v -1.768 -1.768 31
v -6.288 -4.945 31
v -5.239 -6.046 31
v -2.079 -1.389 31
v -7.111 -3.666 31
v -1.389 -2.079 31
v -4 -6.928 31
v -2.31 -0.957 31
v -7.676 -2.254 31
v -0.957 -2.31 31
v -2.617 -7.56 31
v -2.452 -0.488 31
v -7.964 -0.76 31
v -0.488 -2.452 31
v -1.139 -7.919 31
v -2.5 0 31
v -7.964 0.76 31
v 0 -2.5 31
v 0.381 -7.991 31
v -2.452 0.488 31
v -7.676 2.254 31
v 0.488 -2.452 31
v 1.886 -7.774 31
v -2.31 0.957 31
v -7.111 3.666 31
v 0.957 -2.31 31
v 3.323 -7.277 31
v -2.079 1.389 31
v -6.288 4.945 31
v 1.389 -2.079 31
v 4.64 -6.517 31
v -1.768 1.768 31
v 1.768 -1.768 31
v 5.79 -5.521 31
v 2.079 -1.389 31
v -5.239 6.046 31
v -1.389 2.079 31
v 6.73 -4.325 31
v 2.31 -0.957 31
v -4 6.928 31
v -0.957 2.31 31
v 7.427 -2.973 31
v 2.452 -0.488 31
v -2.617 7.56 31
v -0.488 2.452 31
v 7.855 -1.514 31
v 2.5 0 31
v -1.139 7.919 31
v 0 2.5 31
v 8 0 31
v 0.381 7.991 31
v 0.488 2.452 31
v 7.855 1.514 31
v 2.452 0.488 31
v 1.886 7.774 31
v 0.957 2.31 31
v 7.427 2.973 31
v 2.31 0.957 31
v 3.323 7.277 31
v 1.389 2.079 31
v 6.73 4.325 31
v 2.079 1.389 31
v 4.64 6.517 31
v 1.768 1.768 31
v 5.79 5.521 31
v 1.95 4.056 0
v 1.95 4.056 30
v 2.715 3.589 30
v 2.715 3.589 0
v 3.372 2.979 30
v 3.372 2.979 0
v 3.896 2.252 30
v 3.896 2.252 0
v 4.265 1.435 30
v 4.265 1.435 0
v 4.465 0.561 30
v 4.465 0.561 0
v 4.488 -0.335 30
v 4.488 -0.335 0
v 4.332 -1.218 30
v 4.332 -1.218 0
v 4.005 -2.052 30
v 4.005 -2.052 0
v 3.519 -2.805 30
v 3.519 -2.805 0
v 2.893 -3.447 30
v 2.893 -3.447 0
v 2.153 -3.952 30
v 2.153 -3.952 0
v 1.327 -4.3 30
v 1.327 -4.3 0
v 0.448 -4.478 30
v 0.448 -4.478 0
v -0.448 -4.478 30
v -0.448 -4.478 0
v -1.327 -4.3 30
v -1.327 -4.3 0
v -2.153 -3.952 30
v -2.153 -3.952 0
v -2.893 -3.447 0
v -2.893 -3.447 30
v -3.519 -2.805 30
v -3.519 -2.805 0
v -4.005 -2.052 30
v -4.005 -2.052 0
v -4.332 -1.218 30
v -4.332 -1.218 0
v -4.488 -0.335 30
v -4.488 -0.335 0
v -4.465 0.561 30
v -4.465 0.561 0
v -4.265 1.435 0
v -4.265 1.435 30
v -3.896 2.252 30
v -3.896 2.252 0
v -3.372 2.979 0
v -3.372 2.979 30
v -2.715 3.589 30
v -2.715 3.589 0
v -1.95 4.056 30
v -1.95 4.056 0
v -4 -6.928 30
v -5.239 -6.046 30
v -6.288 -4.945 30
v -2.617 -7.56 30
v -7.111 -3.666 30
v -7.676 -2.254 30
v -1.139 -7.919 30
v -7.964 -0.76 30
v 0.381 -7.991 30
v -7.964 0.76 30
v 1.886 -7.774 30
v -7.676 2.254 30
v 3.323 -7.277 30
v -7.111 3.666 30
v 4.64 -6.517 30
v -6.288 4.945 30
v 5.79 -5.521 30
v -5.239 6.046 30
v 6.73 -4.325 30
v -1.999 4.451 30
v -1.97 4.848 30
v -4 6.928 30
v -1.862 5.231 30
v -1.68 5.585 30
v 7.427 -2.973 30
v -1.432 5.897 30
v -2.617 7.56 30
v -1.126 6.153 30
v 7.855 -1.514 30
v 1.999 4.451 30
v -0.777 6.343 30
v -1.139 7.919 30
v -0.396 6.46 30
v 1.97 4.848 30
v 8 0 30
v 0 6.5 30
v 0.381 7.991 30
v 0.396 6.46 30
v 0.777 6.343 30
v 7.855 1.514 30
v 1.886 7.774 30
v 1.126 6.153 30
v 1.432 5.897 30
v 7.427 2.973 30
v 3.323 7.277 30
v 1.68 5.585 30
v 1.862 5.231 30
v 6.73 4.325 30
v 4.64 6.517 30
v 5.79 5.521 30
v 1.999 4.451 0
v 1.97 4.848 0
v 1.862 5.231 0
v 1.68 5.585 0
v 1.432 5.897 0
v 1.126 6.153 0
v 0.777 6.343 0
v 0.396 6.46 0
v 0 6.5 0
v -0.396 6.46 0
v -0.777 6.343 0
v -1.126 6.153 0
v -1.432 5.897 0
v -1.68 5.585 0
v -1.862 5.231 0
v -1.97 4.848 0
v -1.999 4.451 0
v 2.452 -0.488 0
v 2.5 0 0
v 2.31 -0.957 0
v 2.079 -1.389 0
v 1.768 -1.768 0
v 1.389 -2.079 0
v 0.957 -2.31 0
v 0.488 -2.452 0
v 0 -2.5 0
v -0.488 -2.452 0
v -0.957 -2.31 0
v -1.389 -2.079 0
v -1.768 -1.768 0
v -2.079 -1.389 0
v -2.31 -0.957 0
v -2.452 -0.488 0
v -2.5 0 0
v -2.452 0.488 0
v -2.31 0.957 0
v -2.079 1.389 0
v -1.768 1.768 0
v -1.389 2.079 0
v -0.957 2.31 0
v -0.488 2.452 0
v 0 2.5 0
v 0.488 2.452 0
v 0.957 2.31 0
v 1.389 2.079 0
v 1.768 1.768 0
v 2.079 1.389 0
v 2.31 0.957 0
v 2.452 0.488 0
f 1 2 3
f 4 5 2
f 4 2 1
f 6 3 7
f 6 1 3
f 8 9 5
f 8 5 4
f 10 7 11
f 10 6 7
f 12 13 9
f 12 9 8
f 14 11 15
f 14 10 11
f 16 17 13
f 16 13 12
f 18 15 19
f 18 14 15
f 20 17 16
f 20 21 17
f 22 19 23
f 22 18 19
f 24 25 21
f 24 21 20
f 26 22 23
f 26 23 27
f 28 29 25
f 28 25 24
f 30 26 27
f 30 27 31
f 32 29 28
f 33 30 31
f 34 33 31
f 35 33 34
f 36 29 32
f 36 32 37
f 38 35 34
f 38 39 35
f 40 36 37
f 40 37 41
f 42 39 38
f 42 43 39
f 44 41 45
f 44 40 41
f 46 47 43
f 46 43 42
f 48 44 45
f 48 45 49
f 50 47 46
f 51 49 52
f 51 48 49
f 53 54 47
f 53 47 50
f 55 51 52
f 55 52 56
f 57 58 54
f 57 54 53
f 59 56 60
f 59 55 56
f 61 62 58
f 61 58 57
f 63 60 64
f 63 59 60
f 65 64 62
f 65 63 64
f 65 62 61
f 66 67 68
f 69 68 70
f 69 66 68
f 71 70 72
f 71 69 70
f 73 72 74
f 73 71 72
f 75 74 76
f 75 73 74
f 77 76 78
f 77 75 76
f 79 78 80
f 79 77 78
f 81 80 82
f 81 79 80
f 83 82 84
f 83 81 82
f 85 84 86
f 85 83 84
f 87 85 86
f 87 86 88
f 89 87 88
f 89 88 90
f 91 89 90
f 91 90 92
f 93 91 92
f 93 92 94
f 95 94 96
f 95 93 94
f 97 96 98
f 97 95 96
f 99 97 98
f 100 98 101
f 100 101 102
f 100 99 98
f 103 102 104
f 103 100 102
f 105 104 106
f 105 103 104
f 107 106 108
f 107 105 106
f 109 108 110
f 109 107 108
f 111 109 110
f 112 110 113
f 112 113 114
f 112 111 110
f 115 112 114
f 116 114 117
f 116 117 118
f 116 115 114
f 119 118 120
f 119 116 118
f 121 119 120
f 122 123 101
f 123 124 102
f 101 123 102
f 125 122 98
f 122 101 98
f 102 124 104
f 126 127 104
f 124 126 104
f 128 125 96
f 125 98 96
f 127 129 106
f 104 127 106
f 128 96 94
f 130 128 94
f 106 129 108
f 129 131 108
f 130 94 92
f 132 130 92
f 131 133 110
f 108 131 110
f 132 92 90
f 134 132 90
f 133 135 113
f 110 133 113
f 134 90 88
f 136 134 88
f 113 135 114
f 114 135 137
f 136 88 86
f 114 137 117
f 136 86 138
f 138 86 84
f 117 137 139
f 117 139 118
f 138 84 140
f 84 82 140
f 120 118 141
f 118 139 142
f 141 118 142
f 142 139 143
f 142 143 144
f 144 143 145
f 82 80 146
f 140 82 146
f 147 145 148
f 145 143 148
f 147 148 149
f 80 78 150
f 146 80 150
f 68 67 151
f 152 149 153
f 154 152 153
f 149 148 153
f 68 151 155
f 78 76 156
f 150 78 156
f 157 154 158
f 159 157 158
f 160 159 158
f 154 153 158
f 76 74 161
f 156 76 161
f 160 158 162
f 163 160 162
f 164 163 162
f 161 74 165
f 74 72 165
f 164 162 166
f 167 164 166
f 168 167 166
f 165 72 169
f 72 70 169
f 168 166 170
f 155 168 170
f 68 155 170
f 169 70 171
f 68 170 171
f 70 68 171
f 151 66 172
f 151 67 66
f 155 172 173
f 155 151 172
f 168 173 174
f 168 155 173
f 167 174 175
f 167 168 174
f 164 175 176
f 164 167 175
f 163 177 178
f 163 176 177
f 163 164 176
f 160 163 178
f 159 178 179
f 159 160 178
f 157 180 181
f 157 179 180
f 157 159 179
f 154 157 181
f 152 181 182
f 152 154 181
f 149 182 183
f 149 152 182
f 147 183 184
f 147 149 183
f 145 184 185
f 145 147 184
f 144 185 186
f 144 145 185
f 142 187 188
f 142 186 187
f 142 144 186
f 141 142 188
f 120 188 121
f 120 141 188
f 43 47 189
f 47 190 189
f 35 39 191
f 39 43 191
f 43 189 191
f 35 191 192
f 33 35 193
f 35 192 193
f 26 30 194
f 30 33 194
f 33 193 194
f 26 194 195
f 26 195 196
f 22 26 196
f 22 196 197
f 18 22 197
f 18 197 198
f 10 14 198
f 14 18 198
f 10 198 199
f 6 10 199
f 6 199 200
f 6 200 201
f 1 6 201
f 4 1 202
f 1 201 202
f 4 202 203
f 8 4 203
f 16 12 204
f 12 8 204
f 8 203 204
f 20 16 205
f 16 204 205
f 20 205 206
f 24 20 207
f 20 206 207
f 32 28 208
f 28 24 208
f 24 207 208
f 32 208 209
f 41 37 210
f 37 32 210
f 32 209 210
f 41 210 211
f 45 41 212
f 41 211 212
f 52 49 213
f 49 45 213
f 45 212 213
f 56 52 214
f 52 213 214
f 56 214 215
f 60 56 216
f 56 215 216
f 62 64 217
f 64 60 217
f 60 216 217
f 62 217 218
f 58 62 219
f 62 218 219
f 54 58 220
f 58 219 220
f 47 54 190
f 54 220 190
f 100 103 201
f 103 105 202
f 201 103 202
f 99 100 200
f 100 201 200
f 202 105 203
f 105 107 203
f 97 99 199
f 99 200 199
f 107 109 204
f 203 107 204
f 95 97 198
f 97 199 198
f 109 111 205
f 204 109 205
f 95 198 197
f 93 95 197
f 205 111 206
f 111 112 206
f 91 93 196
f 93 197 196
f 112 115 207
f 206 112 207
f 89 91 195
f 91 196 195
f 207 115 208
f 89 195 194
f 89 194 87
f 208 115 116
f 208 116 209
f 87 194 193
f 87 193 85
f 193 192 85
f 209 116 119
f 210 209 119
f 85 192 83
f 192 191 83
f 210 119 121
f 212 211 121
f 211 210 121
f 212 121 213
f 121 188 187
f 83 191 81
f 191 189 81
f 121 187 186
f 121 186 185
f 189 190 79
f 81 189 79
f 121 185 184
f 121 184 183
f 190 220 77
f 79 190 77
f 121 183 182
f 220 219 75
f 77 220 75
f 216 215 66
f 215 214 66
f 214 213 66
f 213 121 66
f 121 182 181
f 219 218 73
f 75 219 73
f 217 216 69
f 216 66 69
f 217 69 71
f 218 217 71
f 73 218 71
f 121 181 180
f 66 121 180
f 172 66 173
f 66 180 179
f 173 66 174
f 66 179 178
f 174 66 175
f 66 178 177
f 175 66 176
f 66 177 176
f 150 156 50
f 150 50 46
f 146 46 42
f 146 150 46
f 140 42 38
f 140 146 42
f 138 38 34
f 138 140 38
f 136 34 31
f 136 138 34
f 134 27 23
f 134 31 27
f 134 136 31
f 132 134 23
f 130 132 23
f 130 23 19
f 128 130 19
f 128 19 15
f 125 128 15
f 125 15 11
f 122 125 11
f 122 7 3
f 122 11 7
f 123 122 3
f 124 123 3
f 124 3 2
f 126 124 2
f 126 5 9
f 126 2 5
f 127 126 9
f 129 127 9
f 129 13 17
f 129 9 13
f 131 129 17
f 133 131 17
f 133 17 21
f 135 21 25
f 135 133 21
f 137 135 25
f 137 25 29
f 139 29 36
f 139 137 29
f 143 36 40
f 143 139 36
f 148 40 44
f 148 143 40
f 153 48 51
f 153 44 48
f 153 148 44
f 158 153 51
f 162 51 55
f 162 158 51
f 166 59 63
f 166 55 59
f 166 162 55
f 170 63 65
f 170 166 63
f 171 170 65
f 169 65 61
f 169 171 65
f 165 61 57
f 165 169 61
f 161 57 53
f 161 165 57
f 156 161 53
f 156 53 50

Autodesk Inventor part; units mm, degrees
ref_plane "YZ Plane" through (0, 0, 0) normal (1, 0, 0) x (0, 1, 0)
ref_plane "XZ Plane" through (0, 0, 0) normal (0, 1, 0) x (-1, 0, 0)
ref_plane "XY Plane" through (0, 0, 0) normal (0, 0, 1) x (1, 0, 0)
sketch "Skizze1" plane through (0, 0, 0) normal (0, 0, 1) x (1, 0, 0)
  circle A0 centre (0, 0) radius 2.5
  circle A1 centre (0, 0) radius 4.5
  dimension "d0" = 5
  dimension "d1" = 9
extrude "Extrusion1" add sketch "Skizze1" along normal blind 30
sketch "Skizze2" plane through (0, 0, 30) normal (0, 0, 1) x (1, 0, 0)
  circle A0 centre (0, 0) radius 4.5 projected
  circle A1 centre (0, 4.5) radius 2
  point P0 (1.95, 4.0556)
  point P1 (-1.95, 4.0556)
  dimension "d4" = 4
extrude "Extrusion2" add sketch "Skizze2" against normal blind 30 contours A0 A1 picked at (-0.7058, 5.0154)
sketch "Skizze3" plane through (0, 0, 30) normal (0, 0, 1) x (1, 0, 0)
  arc A0 (-1.95, 4.0556) -> (1.95, 4.0556) centre (0, 0) ccw projected
  arc A1 (1.95, 4.0556) -> (-1.95, 4.0556) centre (0, 4.5) ccw projected
  circle A2 centre (0, 0) radius 2.5 projected
  circle A3 centre (0, 0) radius 8
  dimension "d7" = 16
extrude "Extrusion3" add sketch "Skizze3" along normal blind 1 contours A1 A0 | A3
properties part number "Motorcameralager"
